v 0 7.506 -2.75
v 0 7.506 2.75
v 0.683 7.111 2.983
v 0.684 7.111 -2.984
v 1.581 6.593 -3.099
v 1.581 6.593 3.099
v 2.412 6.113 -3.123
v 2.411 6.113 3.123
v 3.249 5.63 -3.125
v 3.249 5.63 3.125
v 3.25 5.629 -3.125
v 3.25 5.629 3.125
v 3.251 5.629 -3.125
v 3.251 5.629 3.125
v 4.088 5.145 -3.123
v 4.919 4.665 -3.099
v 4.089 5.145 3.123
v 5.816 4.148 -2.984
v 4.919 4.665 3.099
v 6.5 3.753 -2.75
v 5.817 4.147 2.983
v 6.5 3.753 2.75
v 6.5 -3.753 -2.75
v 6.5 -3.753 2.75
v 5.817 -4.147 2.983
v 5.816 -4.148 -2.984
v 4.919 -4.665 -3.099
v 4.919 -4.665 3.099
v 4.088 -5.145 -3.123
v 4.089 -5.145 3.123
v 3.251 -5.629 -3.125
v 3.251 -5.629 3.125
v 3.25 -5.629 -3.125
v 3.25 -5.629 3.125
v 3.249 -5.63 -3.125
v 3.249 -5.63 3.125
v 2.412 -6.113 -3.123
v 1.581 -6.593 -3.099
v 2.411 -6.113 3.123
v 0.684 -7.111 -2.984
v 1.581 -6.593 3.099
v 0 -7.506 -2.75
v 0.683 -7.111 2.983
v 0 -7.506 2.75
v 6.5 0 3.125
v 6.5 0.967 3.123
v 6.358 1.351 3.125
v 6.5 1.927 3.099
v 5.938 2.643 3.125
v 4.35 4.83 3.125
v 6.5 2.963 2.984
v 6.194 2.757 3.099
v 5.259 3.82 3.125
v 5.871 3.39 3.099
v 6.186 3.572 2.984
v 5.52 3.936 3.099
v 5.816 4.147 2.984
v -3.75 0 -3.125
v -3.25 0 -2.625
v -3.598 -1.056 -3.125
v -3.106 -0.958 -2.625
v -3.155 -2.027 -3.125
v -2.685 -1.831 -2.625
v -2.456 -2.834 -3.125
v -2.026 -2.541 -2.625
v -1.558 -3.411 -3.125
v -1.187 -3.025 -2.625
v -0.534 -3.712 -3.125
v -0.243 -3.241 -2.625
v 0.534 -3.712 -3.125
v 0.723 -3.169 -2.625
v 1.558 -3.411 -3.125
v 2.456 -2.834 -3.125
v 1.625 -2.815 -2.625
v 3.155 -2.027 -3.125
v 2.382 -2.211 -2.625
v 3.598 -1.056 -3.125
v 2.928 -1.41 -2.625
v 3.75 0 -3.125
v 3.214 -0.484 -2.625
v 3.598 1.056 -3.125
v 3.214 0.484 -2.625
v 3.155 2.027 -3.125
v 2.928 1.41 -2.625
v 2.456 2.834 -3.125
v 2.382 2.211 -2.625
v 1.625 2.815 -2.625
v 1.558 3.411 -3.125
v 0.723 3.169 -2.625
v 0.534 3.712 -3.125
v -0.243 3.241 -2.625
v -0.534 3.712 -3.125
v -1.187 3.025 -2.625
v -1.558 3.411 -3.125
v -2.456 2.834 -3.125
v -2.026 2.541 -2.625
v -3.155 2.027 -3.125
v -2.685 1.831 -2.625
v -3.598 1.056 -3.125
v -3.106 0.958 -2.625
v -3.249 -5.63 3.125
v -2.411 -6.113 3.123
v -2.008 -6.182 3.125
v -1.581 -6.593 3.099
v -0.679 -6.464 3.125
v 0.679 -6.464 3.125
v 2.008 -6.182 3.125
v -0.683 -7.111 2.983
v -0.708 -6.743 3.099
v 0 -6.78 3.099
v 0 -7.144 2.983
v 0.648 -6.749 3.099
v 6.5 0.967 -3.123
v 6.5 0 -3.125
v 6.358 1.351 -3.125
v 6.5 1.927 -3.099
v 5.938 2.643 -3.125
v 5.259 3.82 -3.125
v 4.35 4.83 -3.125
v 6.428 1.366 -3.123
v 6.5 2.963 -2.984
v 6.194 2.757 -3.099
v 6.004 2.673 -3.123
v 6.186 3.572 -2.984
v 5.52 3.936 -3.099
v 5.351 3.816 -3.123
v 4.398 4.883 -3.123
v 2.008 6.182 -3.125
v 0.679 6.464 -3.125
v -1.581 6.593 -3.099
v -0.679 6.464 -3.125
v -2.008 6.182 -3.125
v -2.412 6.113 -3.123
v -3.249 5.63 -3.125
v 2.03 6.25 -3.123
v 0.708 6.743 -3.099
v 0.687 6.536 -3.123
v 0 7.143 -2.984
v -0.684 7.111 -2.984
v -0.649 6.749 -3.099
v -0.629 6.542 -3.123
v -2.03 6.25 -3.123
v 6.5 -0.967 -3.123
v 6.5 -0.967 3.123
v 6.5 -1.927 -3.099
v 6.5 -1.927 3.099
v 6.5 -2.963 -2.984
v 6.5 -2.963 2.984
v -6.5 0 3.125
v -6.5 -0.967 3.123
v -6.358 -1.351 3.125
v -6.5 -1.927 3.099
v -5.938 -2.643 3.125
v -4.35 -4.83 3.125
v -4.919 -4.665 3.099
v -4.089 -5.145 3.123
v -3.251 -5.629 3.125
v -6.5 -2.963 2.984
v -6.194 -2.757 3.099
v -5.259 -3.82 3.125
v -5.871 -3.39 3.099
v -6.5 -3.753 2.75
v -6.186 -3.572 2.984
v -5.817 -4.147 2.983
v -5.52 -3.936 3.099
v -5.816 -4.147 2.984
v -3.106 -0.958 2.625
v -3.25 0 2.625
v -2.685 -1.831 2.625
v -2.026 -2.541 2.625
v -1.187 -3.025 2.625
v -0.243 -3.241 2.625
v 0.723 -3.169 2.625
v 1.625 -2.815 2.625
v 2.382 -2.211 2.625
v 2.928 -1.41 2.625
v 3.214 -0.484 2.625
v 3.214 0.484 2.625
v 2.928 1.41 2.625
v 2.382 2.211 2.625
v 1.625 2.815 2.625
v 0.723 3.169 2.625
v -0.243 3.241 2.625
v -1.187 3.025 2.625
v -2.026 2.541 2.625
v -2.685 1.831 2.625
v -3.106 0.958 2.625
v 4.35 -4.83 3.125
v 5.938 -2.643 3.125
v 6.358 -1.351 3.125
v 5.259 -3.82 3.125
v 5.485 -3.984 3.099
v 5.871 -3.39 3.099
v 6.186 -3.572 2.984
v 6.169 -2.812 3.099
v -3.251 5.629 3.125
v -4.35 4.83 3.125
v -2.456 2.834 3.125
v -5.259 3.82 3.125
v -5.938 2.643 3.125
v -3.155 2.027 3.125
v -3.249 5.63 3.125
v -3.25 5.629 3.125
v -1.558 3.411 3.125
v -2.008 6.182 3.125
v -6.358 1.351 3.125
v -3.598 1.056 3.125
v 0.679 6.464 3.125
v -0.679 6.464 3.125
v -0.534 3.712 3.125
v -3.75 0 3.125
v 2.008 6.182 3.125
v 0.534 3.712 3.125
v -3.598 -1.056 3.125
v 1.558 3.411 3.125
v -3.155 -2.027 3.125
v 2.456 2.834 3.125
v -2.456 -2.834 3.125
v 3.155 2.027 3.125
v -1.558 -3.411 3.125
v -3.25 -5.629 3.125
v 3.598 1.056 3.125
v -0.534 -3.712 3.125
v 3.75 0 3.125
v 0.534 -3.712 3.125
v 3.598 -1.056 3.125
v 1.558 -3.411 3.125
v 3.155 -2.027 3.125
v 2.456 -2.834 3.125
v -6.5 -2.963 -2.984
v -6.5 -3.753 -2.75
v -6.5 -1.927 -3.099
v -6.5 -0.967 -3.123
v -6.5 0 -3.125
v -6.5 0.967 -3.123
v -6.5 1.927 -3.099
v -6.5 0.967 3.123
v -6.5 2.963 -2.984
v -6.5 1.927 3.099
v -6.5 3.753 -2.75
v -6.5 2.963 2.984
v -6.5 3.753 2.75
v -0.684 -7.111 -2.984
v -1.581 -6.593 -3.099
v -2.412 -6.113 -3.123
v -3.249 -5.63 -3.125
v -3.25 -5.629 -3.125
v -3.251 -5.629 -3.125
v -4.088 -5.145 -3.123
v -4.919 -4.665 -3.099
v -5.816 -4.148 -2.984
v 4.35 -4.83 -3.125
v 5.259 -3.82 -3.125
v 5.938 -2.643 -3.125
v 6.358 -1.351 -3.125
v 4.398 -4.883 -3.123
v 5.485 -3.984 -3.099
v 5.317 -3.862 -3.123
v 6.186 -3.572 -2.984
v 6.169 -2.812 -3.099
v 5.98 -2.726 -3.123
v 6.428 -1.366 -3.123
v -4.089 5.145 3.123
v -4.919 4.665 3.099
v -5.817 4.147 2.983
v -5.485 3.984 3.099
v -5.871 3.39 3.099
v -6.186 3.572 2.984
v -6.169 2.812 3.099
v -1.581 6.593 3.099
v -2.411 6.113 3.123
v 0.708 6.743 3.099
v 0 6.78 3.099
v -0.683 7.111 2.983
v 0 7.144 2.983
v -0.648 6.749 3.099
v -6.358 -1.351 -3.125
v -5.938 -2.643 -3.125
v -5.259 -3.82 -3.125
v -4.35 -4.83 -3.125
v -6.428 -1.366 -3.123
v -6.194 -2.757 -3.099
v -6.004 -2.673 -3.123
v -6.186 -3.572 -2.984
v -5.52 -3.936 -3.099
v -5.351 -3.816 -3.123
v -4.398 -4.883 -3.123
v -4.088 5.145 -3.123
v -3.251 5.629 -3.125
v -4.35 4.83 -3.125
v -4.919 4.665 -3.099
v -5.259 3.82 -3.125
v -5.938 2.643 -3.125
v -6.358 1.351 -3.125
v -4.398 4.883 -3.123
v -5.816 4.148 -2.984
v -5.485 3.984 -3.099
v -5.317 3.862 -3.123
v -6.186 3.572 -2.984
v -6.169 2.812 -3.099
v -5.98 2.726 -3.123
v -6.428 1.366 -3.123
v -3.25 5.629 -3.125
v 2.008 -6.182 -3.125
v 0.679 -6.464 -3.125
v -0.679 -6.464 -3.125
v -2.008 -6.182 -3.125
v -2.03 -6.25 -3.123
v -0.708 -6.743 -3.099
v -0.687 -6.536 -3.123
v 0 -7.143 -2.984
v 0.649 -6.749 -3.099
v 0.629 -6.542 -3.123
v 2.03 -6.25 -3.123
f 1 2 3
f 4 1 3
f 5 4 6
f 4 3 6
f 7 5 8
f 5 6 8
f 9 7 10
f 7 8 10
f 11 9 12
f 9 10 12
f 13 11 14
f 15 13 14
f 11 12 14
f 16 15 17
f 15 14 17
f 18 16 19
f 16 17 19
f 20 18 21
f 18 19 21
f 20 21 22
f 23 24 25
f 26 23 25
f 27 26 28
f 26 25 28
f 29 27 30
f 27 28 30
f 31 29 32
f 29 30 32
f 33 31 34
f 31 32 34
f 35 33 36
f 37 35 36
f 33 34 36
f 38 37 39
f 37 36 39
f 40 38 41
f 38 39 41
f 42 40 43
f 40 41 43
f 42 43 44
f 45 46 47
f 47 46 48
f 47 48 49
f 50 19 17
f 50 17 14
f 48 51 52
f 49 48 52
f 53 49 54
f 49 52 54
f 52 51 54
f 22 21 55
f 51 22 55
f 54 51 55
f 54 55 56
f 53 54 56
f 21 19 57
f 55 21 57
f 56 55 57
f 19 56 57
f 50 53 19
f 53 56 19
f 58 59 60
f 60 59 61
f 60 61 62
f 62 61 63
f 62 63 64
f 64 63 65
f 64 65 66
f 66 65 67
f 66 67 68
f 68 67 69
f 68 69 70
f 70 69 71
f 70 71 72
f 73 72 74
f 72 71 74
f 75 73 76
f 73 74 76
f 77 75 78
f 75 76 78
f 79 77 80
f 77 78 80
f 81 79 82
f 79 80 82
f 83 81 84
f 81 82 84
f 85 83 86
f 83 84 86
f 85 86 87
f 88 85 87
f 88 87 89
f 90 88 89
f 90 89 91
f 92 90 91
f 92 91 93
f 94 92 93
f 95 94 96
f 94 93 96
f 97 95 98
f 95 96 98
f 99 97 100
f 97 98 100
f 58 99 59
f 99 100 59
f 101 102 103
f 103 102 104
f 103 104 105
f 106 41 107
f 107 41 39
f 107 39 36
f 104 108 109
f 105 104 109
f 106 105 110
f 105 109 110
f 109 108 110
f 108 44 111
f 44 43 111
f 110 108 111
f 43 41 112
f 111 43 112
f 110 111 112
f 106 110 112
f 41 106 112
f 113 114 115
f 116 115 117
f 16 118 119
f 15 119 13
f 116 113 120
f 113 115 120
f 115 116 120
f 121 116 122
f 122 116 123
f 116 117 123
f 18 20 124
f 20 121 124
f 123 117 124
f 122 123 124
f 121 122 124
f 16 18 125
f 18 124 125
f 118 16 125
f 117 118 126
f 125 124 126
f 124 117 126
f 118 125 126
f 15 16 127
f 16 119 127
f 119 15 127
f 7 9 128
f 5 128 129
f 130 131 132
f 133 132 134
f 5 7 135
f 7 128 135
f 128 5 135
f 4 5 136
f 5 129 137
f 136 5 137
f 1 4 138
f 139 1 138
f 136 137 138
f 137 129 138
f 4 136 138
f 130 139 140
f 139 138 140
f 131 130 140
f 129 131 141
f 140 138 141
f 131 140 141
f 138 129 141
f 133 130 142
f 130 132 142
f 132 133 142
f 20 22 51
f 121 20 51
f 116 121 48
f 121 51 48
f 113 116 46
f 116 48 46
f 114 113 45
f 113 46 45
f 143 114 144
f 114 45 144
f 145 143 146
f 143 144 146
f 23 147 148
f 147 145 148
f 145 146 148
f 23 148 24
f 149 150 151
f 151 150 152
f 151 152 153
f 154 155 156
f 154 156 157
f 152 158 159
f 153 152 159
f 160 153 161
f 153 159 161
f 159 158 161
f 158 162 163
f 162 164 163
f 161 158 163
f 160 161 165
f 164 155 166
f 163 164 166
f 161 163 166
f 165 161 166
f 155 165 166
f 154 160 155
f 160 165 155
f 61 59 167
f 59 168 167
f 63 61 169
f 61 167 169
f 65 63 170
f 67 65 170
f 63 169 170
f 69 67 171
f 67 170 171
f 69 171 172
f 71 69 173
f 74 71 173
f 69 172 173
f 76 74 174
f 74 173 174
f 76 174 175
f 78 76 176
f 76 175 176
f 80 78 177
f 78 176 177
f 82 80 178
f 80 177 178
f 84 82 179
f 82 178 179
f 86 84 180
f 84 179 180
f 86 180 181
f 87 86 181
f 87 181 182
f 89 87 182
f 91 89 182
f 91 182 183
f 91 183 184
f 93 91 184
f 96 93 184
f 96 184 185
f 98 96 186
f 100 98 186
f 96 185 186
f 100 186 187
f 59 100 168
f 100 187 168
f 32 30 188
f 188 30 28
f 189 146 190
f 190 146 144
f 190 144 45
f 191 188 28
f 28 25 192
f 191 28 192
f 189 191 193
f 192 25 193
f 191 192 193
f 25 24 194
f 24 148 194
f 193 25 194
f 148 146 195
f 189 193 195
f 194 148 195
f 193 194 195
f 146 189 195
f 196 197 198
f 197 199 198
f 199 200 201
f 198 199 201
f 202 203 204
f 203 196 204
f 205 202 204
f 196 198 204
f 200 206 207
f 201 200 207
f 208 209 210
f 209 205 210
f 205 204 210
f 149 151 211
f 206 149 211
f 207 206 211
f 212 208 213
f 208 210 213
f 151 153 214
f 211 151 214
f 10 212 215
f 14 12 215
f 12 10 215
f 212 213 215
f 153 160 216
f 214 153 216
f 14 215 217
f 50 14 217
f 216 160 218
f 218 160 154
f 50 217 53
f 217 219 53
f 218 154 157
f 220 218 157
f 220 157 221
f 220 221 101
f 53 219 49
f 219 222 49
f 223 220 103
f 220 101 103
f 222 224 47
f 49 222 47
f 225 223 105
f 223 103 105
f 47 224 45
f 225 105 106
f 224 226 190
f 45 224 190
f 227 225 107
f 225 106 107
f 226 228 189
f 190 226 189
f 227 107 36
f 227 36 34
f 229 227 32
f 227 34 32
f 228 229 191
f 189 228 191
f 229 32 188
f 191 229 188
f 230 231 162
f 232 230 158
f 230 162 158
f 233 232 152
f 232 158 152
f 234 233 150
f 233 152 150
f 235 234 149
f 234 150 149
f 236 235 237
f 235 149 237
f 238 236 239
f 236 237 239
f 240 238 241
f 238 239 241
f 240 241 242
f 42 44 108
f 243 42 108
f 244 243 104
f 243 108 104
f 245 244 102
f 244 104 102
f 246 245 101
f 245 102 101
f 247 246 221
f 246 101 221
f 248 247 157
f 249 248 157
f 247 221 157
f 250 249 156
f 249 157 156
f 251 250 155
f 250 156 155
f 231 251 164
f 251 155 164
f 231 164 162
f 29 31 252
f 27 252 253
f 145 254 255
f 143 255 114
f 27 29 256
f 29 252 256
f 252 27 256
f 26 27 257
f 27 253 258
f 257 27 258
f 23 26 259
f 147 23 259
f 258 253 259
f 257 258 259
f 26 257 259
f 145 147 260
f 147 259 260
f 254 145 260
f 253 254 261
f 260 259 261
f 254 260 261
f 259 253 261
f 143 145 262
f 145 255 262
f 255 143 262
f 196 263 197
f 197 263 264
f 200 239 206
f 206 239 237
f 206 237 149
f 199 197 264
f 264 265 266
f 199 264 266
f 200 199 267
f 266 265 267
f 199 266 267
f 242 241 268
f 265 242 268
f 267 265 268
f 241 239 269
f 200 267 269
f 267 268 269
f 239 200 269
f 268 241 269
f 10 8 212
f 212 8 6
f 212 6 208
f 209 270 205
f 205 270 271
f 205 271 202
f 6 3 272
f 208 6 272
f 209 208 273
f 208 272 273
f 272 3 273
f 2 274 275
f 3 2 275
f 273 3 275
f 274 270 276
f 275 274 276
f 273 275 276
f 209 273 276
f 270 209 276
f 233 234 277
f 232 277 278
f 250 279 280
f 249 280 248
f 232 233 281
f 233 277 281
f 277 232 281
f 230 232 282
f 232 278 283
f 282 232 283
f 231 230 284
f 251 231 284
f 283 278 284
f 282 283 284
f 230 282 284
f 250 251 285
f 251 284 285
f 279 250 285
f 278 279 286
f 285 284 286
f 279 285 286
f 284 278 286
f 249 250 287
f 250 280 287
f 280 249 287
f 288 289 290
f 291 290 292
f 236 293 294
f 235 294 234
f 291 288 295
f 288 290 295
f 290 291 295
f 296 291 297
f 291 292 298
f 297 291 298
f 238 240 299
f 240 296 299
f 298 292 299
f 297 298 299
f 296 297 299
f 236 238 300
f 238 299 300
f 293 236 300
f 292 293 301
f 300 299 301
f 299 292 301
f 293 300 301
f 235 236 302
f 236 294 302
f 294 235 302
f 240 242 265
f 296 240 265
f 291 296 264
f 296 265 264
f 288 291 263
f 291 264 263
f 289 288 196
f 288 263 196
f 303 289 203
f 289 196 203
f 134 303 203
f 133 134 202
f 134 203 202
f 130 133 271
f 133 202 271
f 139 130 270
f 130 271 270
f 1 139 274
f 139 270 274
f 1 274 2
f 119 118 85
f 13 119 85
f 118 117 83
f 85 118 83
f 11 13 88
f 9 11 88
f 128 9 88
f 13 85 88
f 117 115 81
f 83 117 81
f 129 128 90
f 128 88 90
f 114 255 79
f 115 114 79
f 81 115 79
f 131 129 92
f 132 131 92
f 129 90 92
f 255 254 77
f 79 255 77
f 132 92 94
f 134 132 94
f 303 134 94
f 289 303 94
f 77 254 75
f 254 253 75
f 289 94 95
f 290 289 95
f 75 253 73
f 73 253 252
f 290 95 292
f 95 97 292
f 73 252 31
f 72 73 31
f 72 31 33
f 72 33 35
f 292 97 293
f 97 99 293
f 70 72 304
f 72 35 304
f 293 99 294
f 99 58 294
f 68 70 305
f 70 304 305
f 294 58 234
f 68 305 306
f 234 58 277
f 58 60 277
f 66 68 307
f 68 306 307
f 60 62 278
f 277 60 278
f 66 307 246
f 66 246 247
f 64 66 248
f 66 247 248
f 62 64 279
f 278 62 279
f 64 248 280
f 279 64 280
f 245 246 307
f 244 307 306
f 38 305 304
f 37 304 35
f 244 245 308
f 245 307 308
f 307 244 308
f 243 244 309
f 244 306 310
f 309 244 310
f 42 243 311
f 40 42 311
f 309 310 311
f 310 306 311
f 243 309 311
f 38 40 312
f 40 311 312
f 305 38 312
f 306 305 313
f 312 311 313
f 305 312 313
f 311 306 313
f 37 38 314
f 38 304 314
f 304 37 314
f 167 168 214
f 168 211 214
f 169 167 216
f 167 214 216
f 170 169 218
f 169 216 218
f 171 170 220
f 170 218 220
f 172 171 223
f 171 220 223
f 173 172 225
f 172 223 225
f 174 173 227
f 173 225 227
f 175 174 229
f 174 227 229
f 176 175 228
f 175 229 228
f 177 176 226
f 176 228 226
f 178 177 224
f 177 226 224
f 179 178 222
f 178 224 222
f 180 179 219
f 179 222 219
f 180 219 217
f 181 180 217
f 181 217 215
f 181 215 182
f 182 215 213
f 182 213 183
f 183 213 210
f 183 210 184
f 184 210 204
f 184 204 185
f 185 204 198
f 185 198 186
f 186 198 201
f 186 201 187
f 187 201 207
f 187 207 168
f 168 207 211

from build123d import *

# Parameters (mm, degrees)
F2_R     = 8.530956
F3_DEPTH = 12.5


with BuildPart() as f1:
    # F0 (on Front) → F1 (revolve)
    with BuildSketch(Plane.XZ):
        with BuildLine():
            Line((-3.25, -2.625), (-3.25, 0))
            Line((-3.25, 0), (-3.25, 2.625))
            Line((-3.25, 2.625), (-3.75, 3.125))
            Line((-3.75, 3.125), (-6.5, 3.125))
            ThreePointArc((-6.5, 3.125), (-7.036601, 3.028199), (-7.505553, 2.75))
            Line((-7.505553, 2.75), (-7.505553, 0))
            Line((-7.505553, 0), (-7.505553, -2.75))
            ThreePointArc((-7.505553, -2.75), (-7.036601, -3.028199), (-6.5, -3.125))
            Line((-6.5, -3.125), (-3.75, -3.125))
            Line((-3.75, -3.125), (-3.25, -2.625))
        make_face()
    revolve(axis=Axis((0, 0, 4.430122), (0, 0, 1)))

    # F2 (on Top) → F3 (cut, symmetric)
    with BuildSketch(Plane.XY):
        Circle(F2_R)
        Polygon((0, 7.505553), (6.5, 3.752777), (6.5, -3.752777), (0, -7.505553), (-6.5, -3.752777), (-6.5, 3.752777), align=None, mode=Mode.SUBTRACT)
    extrude(amount=F3_DEPTH, both=True, mode=Mode.SUBTRACT)


solid = f1.part
